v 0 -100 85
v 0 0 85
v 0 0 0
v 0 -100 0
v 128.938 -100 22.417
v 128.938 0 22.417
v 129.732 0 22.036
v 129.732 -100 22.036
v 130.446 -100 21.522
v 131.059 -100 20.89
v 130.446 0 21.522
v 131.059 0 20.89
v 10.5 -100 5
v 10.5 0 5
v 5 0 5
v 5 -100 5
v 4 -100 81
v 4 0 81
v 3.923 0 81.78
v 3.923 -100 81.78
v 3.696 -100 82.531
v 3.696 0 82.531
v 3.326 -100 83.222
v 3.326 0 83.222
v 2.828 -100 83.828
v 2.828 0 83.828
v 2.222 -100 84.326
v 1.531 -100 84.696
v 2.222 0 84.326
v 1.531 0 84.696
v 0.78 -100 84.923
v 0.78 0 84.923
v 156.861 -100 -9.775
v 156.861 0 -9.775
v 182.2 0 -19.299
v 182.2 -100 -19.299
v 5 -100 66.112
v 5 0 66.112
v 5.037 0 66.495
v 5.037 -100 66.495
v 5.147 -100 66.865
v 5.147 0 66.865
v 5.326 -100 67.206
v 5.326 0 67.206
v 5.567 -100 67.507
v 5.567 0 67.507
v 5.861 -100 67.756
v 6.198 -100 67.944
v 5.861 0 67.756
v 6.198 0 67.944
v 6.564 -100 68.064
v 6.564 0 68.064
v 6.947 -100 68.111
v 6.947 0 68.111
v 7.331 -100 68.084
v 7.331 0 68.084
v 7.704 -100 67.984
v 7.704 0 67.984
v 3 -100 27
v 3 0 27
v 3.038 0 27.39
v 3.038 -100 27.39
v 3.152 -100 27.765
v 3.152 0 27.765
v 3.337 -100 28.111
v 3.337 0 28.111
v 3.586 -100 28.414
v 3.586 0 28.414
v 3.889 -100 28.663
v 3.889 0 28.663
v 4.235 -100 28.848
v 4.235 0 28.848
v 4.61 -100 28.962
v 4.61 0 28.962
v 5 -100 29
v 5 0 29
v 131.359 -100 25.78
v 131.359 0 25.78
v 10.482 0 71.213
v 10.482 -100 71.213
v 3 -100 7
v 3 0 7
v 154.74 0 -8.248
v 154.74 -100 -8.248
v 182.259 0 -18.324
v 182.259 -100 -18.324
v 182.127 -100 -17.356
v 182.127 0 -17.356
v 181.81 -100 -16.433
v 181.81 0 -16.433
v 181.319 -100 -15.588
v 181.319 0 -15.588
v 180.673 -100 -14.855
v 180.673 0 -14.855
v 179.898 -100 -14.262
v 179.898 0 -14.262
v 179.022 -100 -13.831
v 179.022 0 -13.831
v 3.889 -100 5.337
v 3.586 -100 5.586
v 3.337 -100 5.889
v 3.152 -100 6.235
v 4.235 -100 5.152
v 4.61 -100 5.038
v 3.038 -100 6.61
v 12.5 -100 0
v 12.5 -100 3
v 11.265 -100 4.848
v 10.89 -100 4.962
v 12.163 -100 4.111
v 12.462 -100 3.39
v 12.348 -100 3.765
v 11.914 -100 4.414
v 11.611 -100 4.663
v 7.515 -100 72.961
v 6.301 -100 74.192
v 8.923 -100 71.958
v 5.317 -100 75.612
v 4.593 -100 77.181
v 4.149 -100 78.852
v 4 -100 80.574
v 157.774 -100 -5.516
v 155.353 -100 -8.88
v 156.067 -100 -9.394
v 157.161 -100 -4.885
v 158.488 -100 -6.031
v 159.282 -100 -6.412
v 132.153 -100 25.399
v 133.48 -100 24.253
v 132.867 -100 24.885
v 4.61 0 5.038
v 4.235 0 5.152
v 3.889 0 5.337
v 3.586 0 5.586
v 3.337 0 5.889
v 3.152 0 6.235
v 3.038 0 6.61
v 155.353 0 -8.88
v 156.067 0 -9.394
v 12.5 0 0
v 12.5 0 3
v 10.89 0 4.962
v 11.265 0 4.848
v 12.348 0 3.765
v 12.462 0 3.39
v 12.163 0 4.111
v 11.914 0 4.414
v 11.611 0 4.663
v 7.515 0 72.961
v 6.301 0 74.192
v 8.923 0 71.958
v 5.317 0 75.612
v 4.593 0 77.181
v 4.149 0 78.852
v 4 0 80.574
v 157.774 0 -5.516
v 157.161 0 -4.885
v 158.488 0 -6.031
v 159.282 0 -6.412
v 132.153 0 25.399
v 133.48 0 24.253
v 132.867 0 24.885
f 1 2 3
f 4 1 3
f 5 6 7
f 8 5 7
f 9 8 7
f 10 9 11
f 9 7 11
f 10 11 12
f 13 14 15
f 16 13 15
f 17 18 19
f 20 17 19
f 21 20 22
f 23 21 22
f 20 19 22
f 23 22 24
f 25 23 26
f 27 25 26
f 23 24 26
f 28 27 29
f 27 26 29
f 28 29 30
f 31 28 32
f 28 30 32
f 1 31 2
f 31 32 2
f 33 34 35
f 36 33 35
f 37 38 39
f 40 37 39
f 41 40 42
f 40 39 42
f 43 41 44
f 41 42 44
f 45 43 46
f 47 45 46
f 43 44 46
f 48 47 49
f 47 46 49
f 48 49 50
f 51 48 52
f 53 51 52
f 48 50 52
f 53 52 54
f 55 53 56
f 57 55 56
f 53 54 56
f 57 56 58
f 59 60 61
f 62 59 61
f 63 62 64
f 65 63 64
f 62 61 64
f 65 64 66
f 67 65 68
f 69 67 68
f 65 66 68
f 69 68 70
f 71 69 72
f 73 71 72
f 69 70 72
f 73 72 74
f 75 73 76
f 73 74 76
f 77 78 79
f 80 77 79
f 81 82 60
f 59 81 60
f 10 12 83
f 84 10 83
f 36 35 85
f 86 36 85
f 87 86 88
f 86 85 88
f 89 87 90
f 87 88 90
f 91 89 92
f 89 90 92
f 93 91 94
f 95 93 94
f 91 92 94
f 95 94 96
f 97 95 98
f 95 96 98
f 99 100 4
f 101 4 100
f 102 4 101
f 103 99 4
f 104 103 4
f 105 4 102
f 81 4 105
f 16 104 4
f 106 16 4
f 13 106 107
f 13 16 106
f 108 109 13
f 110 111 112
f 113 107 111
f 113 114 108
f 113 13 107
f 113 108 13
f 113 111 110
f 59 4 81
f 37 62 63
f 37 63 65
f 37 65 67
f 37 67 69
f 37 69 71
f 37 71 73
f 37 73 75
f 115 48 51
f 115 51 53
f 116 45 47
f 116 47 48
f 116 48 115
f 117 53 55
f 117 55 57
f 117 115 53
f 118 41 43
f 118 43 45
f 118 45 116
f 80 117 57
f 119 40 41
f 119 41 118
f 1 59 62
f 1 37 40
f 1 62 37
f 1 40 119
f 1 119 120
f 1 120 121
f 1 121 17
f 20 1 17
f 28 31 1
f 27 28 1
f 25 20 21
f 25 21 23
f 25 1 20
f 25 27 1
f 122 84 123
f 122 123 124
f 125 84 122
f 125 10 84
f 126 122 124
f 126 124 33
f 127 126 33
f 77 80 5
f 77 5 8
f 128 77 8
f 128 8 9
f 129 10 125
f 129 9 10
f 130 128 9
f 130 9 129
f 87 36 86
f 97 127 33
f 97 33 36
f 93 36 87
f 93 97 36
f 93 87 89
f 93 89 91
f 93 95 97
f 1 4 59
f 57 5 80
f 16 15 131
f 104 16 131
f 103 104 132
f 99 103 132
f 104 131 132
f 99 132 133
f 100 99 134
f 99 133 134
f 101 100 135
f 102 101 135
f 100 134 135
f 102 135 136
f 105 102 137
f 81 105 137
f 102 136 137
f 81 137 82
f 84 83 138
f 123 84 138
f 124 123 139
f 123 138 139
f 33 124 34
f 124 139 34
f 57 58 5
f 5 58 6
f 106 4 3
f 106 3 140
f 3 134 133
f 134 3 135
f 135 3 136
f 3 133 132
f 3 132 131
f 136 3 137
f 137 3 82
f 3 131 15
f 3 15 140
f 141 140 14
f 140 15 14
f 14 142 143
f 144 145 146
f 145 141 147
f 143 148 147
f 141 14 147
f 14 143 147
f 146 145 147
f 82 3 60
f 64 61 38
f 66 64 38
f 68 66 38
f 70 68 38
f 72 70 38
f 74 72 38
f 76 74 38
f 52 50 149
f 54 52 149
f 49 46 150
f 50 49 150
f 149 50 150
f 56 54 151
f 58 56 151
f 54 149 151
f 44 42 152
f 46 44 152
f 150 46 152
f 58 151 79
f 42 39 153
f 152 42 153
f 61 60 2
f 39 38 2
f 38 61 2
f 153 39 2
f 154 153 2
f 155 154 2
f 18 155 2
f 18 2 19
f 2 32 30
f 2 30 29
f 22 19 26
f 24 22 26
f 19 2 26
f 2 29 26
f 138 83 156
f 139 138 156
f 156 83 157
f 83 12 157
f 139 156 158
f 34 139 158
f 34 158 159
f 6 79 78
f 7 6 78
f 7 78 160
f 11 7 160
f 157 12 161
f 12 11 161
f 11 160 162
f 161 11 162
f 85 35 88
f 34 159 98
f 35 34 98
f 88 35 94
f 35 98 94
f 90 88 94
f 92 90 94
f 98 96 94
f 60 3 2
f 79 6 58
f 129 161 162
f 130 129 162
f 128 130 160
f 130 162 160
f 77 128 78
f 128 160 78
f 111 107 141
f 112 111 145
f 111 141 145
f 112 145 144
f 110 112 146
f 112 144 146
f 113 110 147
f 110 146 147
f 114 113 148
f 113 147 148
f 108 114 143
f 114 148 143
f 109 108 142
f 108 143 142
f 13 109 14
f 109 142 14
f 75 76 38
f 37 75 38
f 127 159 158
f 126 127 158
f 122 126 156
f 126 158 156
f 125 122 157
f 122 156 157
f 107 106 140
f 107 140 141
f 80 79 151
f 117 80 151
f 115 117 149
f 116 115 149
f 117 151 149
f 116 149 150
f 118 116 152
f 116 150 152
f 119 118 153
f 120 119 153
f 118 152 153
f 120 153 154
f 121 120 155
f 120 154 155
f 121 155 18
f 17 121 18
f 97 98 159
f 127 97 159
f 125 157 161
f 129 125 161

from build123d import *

# Parameters (mm, degrees)
F1_DEPTH = 100


with BuildPart() as f1:
    # F0 (on Front) → F1 (new body)
    with BuildSketch(Plane.XZ):
        with BuildLine():
            Line((0, 85), (0, 0))
            Line((0, 0), (12.5, 0))
            Line((12.5, 0), (12.5, 3))
            ThreePointArc((12.5, 3), (11.914214, 4.414214), (10.5, 5))
            Line((10.5, 5), (5, 5))
            ThreePointArc((5, 5), (3.585786, 5.585786), (3, 7))
            Line((3, 7), (3, 27))
            ThreePointArc((3, 27), (3.585786, 28.414214), (5, 29))
            Line((5, 29), (5, 66.111684))
            ThreePointArc((5, 66.111684), (5.861427, 67.755963), (7.703652, 67.983815))
            Line((7.703652, 67.983815), (128.938041, 22.417103))
            ThreePointArc((128.938041, 22.417103), (130.100091, 21.794695), (131.05909, 20.89022))
            Line((131.05909, 20.89022), (154.73982, -8.247924))
            ThreePointArc((154.73982, -8.247924), (155.698819, -9.152399), (156.86087, -9.774807))
            Line((156.86087, -9.774807), (182.2, -19.29868))
            ThreePointArc((182.2, -19.29868), (181.585124, -15.998362), (179.021539, -13.830829))
            Line((179.021539, -13.830829), (159.281959, -6.411583))
            ThreePointArc((159.281959, -6.411583), (158.119909, -5.789175), (157.16091, -4.8847))
            Line((157.16091, -4.8847), (133.48018, 24.253443))
            ThreePointArc((133.48018, 24.253443), (132.521181, 25.157918), (131.35913, 25.780327))
            Line((131.35913, 25.780327), (10.481739, 71.212859))
            ThreePointArc((10.481739, 71.212859), (5.778607, 74.88065), (4, 80.573513))
            Line((4, 80.573513), (4, 81))
            ThreePointArc((4, 81), (2.828427, 83.828427), (0, 85))
        make_face()
    extrude(amount=F1_DEPTH)


solid = f1.part
